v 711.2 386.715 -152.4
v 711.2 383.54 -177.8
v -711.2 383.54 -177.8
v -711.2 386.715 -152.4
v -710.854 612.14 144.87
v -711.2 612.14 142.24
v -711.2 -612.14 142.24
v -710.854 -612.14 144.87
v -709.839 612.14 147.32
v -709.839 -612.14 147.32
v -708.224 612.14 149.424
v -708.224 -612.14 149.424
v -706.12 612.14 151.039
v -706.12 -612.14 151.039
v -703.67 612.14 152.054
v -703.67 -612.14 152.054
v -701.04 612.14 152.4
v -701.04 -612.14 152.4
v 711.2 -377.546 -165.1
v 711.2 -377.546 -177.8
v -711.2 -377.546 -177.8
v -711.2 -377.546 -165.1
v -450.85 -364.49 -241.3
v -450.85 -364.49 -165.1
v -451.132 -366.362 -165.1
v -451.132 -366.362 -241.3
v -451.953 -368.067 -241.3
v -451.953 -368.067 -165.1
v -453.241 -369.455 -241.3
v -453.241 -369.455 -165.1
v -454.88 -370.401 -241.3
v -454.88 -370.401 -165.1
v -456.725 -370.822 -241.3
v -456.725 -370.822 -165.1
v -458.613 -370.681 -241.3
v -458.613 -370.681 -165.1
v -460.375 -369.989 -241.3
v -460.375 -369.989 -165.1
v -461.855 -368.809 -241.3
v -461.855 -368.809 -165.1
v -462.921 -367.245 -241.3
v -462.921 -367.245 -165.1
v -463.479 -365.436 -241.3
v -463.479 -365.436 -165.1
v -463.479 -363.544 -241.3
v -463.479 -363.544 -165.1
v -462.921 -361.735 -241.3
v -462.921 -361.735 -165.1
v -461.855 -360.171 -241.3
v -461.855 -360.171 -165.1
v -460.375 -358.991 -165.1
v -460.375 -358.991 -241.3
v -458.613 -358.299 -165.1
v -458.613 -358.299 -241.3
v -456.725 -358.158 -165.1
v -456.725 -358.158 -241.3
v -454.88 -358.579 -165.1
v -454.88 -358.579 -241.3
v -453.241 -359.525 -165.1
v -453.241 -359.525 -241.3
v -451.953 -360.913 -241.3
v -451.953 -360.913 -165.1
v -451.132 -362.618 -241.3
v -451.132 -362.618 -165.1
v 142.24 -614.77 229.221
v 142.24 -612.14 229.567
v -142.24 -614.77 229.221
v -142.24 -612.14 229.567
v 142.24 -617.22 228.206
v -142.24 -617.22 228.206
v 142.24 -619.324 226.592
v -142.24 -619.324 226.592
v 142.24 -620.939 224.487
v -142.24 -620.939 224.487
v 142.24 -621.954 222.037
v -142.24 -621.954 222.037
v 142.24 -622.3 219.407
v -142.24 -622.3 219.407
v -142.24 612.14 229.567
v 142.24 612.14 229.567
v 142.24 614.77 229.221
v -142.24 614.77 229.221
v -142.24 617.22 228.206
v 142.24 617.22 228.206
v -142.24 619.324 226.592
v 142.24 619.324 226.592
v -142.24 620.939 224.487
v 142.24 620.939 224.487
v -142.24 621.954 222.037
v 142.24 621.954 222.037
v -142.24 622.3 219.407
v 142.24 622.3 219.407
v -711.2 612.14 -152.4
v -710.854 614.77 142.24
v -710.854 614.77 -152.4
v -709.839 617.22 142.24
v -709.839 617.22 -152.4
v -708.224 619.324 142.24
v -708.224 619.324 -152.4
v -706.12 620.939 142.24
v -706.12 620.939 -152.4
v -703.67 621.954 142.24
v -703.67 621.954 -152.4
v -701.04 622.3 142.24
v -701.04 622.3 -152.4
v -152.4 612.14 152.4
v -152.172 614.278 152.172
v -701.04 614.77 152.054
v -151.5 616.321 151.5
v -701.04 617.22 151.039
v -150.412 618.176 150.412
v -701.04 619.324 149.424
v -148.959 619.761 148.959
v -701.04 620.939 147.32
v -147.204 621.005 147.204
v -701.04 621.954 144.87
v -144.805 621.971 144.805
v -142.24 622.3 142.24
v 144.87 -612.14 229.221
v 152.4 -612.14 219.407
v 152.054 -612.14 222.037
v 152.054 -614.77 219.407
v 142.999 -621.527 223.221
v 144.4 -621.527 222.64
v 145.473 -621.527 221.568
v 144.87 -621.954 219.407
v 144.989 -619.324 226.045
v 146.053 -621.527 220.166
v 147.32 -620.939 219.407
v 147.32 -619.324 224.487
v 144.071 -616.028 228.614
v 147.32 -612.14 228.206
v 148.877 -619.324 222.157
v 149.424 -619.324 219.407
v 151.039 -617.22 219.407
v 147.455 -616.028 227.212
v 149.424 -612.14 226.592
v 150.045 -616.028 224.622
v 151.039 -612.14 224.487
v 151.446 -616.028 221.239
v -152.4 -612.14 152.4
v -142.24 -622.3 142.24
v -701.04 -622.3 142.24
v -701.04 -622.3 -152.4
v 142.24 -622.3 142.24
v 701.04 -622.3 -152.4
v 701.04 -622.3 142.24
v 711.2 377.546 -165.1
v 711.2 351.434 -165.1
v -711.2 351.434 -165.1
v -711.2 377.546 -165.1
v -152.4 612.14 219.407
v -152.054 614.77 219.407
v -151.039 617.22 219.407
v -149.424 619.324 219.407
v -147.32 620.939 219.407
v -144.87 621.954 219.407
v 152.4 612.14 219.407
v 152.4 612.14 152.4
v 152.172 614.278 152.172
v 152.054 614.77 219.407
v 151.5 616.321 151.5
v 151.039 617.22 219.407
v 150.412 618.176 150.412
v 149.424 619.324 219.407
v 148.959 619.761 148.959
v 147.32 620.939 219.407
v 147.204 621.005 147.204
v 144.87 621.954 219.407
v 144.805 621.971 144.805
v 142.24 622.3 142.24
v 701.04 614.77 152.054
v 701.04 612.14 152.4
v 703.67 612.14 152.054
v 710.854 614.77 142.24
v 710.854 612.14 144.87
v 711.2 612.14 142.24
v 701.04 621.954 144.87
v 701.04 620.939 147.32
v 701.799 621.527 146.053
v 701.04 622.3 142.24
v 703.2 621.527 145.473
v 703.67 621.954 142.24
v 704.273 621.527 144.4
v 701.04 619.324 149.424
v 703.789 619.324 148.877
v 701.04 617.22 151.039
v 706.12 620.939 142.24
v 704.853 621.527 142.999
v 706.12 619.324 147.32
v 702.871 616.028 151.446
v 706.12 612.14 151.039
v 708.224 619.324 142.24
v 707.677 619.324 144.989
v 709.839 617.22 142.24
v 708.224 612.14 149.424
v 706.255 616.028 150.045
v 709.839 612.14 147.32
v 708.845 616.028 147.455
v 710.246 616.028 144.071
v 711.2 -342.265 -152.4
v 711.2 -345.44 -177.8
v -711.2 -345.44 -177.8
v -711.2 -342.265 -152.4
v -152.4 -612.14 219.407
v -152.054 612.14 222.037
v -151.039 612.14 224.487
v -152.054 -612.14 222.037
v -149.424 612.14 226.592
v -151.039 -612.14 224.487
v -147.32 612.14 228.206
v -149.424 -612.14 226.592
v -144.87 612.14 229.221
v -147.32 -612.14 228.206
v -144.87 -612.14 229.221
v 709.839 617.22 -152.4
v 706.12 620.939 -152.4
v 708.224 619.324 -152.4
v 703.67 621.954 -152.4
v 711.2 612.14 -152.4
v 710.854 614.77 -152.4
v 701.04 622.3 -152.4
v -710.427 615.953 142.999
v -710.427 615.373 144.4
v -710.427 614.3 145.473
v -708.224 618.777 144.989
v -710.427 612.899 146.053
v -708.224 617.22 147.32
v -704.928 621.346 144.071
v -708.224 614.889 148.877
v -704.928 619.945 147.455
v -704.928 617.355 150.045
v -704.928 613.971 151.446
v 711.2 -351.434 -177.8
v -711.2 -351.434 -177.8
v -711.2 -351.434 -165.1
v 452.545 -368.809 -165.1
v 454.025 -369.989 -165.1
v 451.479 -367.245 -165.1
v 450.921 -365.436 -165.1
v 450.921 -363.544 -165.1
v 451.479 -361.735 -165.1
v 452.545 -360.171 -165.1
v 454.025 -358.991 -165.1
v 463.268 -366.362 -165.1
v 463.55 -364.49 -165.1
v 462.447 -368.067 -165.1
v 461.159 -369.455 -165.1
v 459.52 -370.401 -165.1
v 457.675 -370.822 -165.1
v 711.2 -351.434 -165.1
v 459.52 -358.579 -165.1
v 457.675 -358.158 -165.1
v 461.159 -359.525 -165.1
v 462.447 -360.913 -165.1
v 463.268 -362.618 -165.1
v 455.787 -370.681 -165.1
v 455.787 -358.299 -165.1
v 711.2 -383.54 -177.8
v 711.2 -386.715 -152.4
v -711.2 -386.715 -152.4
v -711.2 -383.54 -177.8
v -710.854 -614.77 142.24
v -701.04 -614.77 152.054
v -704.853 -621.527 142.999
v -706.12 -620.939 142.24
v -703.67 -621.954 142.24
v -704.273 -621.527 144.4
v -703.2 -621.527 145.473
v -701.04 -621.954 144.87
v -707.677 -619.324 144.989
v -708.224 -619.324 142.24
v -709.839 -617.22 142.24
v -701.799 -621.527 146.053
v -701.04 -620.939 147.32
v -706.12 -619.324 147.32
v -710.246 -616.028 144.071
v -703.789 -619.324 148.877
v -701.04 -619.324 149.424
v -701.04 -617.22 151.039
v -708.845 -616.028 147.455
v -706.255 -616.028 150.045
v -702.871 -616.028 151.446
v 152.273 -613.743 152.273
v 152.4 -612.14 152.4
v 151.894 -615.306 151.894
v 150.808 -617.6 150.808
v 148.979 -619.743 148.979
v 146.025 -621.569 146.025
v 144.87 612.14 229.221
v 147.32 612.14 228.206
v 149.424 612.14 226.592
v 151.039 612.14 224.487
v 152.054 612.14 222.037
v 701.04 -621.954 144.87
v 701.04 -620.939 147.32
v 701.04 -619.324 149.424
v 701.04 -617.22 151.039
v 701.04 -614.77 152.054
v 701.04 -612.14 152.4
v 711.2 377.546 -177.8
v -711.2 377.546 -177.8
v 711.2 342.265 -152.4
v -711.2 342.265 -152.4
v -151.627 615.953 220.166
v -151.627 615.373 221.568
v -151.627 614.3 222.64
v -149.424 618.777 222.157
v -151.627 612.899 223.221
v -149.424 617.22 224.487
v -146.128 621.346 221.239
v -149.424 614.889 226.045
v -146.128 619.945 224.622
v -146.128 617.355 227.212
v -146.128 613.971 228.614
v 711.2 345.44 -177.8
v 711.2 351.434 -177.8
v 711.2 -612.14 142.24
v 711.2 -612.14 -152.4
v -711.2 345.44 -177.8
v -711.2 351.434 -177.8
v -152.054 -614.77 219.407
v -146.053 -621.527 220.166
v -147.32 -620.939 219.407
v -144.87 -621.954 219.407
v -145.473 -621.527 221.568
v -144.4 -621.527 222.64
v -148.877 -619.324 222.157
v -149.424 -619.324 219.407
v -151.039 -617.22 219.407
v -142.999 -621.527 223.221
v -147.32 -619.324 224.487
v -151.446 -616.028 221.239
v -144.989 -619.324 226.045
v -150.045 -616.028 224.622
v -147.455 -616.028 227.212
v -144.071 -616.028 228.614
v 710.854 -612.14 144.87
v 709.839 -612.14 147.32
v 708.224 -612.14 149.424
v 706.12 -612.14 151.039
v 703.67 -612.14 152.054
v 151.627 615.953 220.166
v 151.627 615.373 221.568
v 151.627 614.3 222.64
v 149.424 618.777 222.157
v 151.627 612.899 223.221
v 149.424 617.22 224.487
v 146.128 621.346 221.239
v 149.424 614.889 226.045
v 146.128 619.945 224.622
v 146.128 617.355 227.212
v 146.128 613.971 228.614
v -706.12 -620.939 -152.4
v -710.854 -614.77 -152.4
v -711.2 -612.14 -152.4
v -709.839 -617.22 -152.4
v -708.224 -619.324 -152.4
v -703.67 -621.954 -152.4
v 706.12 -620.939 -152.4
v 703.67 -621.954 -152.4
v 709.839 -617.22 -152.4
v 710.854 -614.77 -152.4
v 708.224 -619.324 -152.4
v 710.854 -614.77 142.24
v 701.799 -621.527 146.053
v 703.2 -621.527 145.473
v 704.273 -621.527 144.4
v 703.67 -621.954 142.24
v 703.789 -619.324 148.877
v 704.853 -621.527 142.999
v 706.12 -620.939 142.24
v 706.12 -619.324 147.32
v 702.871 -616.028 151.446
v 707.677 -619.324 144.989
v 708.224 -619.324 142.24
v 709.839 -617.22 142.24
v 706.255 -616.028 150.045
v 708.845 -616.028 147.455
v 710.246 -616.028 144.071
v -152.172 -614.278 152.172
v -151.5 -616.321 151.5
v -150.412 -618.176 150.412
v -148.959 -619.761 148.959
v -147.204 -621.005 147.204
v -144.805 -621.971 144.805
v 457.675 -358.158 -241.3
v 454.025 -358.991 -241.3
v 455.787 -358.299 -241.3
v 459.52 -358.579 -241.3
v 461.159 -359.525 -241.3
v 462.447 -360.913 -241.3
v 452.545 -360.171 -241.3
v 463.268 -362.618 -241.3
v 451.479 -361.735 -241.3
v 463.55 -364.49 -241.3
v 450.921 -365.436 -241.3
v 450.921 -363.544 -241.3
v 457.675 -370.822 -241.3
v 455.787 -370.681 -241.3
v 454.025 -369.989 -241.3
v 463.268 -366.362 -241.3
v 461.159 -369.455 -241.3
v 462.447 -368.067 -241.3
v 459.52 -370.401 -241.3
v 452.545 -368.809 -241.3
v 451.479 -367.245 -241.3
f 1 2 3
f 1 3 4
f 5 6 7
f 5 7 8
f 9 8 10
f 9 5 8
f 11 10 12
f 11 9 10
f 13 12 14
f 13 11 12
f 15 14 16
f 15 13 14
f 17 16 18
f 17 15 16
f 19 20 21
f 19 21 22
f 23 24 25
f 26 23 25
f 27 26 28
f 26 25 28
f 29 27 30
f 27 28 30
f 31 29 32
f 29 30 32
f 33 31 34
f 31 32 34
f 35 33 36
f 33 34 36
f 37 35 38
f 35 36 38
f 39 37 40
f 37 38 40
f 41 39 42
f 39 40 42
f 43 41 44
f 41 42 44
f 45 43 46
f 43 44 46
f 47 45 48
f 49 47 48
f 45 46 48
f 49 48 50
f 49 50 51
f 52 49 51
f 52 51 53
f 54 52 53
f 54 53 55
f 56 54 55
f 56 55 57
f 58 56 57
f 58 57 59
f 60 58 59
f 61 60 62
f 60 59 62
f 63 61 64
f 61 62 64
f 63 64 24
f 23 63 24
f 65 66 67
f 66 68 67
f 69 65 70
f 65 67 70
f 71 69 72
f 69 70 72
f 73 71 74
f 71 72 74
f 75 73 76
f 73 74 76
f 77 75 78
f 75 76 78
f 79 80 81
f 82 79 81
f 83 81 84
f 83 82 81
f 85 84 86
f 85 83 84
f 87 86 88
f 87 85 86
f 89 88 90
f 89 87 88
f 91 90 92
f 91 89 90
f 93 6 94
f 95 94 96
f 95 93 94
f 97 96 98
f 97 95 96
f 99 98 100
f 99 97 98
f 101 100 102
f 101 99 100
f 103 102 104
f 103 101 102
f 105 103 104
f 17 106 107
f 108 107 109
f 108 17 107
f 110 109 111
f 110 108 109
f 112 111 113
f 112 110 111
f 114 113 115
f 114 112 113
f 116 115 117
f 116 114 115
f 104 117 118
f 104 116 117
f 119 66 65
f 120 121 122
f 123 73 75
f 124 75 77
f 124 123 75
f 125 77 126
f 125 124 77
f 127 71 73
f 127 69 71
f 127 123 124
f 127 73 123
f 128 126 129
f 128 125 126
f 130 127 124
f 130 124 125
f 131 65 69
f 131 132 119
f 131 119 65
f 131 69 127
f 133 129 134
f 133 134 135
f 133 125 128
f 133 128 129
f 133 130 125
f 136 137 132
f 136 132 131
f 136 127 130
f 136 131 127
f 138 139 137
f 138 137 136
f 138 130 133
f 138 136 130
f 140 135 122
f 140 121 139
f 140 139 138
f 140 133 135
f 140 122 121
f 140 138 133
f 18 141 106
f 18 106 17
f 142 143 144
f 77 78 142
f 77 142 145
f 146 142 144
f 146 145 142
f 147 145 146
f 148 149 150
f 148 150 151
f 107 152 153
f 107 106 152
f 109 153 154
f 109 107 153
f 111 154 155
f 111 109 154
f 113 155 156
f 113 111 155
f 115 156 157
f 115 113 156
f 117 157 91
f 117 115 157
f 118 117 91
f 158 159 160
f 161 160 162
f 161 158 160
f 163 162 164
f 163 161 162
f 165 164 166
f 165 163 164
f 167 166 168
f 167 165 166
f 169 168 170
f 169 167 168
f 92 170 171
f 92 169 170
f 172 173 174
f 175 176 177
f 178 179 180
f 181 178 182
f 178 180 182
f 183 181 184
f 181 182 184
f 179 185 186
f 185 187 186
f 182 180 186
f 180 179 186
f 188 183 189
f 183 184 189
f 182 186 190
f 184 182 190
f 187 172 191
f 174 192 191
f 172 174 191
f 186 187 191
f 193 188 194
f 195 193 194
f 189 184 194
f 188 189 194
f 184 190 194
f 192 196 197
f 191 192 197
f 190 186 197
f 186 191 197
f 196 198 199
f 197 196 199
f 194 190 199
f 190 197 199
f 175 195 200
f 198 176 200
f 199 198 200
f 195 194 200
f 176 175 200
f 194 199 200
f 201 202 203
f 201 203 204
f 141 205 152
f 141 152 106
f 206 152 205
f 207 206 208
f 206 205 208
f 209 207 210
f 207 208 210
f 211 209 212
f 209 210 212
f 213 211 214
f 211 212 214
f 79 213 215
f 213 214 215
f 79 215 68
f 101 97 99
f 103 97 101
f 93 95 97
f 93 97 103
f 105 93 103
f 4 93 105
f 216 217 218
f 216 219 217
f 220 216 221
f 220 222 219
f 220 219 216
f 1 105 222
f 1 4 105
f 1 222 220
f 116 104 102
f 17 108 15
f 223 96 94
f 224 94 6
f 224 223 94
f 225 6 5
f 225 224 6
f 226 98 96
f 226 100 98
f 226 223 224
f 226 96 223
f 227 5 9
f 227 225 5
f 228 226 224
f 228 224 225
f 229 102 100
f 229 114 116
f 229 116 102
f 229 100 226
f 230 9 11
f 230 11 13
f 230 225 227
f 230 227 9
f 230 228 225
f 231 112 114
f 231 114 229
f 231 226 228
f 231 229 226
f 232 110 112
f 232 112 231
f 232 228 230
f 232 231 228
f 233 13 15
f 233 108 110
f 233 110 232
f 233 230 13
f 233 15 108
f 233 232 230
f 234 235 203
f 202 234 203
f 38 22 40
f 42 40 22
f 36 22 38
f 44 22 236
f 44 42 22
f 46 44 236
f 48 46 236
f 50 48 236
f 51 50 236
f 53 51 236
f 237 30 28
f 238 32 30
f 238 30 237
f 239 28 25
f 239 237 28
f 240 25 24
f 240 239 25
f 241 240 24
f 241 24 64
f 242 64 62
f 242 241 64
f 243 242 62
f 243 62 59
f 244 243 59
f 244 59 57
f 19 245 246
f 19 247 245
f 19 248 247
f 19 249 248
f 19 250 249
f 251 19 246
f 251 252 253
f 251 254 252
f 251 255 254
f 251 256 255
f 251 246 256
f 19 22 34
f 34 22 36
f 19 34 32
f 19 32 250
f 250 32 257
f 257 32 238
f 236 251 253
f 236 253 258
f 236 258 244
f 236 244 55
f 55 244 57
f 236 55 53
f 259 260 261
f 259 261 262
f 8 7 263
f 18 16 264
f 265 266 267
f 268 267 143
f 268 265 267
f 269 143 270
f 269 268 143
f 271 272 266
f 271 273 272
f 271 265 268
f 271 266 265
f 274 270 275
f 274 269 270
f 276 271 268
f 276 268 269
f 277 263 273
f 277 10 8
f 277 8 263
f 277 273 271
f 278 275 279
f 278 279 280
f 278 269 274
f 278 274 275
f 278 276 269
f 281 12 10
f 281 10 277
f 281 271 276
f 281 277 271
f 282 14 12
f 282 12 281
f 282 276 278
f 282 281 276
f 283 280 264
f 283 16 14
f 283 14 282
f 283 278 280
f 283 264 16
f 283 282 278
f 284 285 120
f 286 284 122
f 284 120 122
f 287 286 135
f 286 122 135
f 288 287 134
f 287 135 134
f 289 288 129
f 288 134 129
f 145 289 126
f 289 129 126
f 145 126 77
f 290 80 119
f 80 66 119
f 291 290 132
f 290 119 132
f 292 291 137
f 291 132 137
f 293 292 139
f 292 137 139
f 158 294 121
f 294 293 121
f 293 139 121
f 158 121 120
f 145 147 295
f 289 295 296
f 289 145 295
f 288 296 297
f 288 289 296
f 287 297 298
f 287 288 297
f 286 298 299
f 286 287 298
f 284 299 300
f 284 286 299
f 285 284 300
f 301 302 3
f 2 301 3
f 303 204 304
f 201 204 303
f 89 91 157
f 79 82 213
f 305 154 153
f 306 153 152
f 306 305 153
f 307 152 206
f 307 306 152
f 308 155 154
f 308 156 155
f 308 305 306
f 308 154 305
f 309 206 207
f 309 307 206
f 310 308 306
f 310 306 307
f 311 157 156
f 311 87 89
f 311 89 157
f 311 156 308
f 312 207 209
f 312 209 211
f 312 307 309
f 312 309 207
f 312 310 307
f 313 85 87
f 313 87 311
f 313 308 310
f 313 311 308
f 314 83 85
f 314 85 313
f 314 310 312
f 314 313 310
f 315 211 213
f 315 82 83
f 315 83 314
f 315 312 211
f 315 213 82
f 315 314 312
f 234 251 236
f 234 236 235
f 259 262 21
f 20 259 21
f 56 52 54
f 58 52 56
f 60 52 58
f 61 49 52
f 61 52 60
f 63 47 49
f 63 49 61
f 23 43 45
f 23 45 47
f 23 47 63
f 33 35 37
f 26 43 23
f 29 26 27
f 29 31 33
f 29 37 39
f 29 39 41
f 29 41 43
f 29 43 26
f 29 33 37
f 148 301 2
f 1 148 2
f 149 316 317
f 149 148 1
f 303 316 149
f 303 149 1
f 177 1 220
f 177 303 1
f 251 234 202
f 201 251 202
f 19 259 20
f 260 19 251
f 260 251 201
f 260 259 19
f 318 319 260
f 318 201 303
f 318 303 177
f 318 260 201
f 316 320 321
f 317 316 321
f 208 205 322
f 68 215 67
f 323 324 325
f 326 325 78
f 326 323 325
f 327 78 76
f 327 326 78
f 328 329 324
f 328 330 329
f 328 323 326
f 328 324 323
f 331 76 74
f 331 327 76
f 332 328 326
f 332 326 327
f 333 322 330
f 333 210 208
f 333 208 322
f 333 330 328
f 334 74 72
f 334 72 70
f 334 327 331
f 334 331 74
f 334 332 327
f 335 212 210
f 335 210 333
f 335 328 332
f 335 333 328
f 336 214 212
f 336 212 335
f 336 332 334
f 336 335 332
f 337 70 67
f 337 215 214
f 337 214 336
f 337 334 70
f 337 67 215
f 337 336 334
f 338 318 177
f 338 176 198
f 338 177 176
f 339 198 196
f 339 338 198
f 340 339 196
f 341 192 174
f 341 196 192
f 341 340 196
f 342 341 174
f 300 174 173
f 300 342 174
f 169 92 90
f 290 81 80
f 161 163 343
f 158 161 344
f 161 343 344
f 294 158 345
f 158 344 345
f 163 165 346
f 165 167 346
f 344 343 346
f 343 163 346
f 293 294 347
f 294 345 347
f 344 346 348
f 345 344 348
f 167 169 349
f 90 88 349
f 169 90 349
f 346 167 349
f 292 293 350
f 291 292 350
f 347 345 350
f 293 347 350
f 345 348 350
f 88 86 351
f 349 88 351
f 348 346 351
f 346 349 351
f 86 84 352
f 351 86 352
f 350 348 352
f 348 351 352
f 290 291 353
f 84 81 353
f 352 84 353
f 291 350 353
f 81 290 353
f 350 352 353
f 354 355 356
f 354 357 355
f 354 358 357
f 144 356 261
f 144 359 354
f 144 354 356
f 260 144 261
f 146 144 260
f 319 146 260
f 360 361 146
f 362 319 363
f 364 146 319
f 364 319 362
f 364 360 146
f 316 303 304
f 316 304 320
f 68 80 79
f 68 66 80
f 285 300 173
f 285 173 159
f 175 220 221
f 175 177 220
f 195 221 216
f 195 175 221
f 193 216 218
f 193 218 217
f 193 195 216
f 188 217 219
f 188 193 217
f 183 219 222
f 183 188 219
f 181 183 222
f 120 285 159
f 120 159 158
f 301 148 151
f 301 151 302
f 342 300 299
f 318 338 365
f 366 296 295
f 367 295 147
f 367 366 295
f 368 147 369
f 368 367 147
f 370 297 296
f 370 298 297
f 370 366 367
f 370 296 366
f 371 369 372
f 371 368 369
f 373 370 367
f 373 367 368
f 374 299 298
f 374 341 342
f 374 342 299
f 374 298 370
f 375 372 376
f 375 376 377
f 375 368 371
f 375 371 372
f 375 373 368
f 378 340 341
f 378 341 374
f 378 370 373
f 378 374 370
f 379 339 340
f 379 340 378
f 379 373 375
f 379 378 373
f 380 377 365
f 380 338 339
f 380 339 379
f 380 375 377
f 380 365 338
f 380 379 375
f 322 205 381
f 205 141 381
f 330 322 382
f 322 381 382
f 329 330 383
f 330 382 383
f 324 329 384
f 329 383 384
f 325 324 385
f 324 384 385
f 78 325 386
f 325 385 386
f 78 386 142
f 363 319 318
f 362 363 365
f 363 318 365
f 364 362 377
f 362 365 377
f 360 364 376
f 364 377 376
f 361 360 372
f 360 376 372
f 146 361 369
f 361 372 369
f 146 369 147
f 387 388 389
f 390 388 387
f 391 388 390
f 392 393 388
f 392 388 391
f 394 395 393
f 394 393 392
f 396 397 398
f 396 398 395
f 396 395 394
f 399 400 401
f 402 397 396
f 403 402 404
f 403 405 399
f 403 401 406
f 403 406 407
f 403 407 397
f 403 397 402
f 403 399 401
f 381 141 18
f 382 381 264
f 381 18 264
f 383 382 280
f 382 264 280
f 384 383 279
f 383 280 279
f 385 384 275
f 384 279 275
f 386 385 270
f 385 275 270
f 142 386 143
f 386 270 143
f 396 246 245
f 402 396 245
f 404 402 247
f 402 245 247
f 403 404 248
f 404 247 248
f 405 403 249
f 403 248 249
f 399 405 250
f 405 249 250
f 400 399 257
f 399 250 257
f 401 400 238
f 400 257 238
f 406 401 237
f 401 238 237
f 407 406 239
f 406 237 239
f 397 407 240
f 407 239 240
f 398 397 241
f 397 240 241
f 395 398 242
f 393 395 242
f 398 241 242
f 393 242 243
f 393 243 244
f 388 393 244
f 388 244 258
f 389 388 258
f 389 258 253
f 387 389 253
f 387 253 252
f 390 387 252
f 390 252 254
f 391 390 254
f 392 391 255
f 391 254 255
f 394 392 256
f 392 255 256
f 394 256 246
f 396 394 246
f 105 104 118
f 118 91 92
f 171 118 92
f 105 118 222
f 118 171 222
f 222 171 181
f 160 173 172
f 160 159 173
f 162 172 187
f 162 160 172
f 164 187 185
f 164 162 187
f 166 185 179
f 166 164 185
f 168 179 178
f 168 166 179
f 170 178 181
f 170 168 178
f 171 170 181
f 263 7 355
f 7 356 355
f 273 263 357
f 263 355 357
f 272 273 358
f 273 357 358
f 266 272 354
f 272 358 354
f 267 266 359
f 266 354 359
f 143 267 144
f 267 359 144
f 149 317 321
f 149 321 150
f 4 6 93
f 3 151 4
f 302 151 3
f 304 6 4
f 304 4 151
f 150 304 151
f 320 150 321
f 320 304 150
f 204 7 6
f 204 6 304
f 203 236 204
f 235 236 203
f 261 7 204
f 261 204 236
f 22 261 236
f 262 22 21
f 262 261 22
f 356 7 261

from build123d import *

# Parameters (mm, degrees)
F1_DEPTH = 622.3
F2_R     = 10.16
F4_DEPTH = 1422.4
F5_R     = 6.35
F6_DEPTH = 76.2


with BuildPart() as f1:
    # F0 (on Front) → F1 (new body, symmetric)
    with BuildSketch(Plane.XZ):
        Polygon((711.2, -152.4), (711.2, 152.4), (152.4, 152.4), (152.4, 75.2325318336), (-152.4, 75.2325318336), (-152.4, 152.4), (-711.2, 152.4), (-711.2, -152.4), align=None)
        Polygon((152.4, 75.2325318336), (152.4, 152.4), (152.4, 229.5674681664), (-152.4, 229.5674681664), (-152.4, 152.4), (-152.4, 75.2325318336), align=None)
    extrude(amount=F1_DEPTH, both=True)

    # F2
    f2_edges = [f1.edges().sort_by_distance(p)[0] for p in [
        (711.2, 0, 152.4),
        (431.8, -622.3, 152.4),
        (711.2, -622.3, 0),
        (431.8, 622.3, 152.4),
        (711.2, 622.3, 0),
        (0, 622.3, 229.567468),
        (152.4, 622.3, 190.983734),
        (152.4, 0, 229.567468),
        (-152.4, 622.3, 190.983734),
        (-152.4, 0, 229.567468),
        (-431.8, 622.3, 152.4),
        (-711.2, 622.3, 0),
        (-711.2, 0, 152.4),
        (-711.2, -622.3, 0),
        (-431.8, -622.3, 152.4),
        (-152.4, -622.3, 190.983734),
        (0, -622.3, 229.567468),
        (152.4, -622.3, 190.983734),
    ]]
    fillet(f2_edges, radius=F2_R)

    # F3 (on face) → F4 (join)
    with BuildSketch(Plane.YZ.offset(711.2)):
        Polygon((-342.265, -152.4), (-386.715, -152.4), (-383.54, -177.8), (-377.5456, -177.8), (-377.5456, -165.1), (-351.4344, -165.1), (-351.4344, -177.8), (-345.44, -177.8), align=None)
        Polygon((386.715, -152.3999997139), (342.265, -152.3999997139), (345.44, -177.7999997139), (351.4344, -177.7999997139), (351.4344, -165.0999997139), (377.5456, -165.0999997139), (377.5456, -177.7999997139), (383.54, -177.7999997139), align=None)
    extrude(amount=-F4_DEPTH)

    # F5 (on face) → F6 (join)
    with BuildSketch(Plane(origin=(0, 0, -165.1), x_dir=(1, 0, 0), z_dir=(0, 0, -1))):
        with Locations((457.2, 364.49)):
            Circle(F5_R)
        with Locations((-457.2, 364.49)):
            Circle(F5_R)
    extrude(amount=F6_DEPTH)


solid = f1.part
